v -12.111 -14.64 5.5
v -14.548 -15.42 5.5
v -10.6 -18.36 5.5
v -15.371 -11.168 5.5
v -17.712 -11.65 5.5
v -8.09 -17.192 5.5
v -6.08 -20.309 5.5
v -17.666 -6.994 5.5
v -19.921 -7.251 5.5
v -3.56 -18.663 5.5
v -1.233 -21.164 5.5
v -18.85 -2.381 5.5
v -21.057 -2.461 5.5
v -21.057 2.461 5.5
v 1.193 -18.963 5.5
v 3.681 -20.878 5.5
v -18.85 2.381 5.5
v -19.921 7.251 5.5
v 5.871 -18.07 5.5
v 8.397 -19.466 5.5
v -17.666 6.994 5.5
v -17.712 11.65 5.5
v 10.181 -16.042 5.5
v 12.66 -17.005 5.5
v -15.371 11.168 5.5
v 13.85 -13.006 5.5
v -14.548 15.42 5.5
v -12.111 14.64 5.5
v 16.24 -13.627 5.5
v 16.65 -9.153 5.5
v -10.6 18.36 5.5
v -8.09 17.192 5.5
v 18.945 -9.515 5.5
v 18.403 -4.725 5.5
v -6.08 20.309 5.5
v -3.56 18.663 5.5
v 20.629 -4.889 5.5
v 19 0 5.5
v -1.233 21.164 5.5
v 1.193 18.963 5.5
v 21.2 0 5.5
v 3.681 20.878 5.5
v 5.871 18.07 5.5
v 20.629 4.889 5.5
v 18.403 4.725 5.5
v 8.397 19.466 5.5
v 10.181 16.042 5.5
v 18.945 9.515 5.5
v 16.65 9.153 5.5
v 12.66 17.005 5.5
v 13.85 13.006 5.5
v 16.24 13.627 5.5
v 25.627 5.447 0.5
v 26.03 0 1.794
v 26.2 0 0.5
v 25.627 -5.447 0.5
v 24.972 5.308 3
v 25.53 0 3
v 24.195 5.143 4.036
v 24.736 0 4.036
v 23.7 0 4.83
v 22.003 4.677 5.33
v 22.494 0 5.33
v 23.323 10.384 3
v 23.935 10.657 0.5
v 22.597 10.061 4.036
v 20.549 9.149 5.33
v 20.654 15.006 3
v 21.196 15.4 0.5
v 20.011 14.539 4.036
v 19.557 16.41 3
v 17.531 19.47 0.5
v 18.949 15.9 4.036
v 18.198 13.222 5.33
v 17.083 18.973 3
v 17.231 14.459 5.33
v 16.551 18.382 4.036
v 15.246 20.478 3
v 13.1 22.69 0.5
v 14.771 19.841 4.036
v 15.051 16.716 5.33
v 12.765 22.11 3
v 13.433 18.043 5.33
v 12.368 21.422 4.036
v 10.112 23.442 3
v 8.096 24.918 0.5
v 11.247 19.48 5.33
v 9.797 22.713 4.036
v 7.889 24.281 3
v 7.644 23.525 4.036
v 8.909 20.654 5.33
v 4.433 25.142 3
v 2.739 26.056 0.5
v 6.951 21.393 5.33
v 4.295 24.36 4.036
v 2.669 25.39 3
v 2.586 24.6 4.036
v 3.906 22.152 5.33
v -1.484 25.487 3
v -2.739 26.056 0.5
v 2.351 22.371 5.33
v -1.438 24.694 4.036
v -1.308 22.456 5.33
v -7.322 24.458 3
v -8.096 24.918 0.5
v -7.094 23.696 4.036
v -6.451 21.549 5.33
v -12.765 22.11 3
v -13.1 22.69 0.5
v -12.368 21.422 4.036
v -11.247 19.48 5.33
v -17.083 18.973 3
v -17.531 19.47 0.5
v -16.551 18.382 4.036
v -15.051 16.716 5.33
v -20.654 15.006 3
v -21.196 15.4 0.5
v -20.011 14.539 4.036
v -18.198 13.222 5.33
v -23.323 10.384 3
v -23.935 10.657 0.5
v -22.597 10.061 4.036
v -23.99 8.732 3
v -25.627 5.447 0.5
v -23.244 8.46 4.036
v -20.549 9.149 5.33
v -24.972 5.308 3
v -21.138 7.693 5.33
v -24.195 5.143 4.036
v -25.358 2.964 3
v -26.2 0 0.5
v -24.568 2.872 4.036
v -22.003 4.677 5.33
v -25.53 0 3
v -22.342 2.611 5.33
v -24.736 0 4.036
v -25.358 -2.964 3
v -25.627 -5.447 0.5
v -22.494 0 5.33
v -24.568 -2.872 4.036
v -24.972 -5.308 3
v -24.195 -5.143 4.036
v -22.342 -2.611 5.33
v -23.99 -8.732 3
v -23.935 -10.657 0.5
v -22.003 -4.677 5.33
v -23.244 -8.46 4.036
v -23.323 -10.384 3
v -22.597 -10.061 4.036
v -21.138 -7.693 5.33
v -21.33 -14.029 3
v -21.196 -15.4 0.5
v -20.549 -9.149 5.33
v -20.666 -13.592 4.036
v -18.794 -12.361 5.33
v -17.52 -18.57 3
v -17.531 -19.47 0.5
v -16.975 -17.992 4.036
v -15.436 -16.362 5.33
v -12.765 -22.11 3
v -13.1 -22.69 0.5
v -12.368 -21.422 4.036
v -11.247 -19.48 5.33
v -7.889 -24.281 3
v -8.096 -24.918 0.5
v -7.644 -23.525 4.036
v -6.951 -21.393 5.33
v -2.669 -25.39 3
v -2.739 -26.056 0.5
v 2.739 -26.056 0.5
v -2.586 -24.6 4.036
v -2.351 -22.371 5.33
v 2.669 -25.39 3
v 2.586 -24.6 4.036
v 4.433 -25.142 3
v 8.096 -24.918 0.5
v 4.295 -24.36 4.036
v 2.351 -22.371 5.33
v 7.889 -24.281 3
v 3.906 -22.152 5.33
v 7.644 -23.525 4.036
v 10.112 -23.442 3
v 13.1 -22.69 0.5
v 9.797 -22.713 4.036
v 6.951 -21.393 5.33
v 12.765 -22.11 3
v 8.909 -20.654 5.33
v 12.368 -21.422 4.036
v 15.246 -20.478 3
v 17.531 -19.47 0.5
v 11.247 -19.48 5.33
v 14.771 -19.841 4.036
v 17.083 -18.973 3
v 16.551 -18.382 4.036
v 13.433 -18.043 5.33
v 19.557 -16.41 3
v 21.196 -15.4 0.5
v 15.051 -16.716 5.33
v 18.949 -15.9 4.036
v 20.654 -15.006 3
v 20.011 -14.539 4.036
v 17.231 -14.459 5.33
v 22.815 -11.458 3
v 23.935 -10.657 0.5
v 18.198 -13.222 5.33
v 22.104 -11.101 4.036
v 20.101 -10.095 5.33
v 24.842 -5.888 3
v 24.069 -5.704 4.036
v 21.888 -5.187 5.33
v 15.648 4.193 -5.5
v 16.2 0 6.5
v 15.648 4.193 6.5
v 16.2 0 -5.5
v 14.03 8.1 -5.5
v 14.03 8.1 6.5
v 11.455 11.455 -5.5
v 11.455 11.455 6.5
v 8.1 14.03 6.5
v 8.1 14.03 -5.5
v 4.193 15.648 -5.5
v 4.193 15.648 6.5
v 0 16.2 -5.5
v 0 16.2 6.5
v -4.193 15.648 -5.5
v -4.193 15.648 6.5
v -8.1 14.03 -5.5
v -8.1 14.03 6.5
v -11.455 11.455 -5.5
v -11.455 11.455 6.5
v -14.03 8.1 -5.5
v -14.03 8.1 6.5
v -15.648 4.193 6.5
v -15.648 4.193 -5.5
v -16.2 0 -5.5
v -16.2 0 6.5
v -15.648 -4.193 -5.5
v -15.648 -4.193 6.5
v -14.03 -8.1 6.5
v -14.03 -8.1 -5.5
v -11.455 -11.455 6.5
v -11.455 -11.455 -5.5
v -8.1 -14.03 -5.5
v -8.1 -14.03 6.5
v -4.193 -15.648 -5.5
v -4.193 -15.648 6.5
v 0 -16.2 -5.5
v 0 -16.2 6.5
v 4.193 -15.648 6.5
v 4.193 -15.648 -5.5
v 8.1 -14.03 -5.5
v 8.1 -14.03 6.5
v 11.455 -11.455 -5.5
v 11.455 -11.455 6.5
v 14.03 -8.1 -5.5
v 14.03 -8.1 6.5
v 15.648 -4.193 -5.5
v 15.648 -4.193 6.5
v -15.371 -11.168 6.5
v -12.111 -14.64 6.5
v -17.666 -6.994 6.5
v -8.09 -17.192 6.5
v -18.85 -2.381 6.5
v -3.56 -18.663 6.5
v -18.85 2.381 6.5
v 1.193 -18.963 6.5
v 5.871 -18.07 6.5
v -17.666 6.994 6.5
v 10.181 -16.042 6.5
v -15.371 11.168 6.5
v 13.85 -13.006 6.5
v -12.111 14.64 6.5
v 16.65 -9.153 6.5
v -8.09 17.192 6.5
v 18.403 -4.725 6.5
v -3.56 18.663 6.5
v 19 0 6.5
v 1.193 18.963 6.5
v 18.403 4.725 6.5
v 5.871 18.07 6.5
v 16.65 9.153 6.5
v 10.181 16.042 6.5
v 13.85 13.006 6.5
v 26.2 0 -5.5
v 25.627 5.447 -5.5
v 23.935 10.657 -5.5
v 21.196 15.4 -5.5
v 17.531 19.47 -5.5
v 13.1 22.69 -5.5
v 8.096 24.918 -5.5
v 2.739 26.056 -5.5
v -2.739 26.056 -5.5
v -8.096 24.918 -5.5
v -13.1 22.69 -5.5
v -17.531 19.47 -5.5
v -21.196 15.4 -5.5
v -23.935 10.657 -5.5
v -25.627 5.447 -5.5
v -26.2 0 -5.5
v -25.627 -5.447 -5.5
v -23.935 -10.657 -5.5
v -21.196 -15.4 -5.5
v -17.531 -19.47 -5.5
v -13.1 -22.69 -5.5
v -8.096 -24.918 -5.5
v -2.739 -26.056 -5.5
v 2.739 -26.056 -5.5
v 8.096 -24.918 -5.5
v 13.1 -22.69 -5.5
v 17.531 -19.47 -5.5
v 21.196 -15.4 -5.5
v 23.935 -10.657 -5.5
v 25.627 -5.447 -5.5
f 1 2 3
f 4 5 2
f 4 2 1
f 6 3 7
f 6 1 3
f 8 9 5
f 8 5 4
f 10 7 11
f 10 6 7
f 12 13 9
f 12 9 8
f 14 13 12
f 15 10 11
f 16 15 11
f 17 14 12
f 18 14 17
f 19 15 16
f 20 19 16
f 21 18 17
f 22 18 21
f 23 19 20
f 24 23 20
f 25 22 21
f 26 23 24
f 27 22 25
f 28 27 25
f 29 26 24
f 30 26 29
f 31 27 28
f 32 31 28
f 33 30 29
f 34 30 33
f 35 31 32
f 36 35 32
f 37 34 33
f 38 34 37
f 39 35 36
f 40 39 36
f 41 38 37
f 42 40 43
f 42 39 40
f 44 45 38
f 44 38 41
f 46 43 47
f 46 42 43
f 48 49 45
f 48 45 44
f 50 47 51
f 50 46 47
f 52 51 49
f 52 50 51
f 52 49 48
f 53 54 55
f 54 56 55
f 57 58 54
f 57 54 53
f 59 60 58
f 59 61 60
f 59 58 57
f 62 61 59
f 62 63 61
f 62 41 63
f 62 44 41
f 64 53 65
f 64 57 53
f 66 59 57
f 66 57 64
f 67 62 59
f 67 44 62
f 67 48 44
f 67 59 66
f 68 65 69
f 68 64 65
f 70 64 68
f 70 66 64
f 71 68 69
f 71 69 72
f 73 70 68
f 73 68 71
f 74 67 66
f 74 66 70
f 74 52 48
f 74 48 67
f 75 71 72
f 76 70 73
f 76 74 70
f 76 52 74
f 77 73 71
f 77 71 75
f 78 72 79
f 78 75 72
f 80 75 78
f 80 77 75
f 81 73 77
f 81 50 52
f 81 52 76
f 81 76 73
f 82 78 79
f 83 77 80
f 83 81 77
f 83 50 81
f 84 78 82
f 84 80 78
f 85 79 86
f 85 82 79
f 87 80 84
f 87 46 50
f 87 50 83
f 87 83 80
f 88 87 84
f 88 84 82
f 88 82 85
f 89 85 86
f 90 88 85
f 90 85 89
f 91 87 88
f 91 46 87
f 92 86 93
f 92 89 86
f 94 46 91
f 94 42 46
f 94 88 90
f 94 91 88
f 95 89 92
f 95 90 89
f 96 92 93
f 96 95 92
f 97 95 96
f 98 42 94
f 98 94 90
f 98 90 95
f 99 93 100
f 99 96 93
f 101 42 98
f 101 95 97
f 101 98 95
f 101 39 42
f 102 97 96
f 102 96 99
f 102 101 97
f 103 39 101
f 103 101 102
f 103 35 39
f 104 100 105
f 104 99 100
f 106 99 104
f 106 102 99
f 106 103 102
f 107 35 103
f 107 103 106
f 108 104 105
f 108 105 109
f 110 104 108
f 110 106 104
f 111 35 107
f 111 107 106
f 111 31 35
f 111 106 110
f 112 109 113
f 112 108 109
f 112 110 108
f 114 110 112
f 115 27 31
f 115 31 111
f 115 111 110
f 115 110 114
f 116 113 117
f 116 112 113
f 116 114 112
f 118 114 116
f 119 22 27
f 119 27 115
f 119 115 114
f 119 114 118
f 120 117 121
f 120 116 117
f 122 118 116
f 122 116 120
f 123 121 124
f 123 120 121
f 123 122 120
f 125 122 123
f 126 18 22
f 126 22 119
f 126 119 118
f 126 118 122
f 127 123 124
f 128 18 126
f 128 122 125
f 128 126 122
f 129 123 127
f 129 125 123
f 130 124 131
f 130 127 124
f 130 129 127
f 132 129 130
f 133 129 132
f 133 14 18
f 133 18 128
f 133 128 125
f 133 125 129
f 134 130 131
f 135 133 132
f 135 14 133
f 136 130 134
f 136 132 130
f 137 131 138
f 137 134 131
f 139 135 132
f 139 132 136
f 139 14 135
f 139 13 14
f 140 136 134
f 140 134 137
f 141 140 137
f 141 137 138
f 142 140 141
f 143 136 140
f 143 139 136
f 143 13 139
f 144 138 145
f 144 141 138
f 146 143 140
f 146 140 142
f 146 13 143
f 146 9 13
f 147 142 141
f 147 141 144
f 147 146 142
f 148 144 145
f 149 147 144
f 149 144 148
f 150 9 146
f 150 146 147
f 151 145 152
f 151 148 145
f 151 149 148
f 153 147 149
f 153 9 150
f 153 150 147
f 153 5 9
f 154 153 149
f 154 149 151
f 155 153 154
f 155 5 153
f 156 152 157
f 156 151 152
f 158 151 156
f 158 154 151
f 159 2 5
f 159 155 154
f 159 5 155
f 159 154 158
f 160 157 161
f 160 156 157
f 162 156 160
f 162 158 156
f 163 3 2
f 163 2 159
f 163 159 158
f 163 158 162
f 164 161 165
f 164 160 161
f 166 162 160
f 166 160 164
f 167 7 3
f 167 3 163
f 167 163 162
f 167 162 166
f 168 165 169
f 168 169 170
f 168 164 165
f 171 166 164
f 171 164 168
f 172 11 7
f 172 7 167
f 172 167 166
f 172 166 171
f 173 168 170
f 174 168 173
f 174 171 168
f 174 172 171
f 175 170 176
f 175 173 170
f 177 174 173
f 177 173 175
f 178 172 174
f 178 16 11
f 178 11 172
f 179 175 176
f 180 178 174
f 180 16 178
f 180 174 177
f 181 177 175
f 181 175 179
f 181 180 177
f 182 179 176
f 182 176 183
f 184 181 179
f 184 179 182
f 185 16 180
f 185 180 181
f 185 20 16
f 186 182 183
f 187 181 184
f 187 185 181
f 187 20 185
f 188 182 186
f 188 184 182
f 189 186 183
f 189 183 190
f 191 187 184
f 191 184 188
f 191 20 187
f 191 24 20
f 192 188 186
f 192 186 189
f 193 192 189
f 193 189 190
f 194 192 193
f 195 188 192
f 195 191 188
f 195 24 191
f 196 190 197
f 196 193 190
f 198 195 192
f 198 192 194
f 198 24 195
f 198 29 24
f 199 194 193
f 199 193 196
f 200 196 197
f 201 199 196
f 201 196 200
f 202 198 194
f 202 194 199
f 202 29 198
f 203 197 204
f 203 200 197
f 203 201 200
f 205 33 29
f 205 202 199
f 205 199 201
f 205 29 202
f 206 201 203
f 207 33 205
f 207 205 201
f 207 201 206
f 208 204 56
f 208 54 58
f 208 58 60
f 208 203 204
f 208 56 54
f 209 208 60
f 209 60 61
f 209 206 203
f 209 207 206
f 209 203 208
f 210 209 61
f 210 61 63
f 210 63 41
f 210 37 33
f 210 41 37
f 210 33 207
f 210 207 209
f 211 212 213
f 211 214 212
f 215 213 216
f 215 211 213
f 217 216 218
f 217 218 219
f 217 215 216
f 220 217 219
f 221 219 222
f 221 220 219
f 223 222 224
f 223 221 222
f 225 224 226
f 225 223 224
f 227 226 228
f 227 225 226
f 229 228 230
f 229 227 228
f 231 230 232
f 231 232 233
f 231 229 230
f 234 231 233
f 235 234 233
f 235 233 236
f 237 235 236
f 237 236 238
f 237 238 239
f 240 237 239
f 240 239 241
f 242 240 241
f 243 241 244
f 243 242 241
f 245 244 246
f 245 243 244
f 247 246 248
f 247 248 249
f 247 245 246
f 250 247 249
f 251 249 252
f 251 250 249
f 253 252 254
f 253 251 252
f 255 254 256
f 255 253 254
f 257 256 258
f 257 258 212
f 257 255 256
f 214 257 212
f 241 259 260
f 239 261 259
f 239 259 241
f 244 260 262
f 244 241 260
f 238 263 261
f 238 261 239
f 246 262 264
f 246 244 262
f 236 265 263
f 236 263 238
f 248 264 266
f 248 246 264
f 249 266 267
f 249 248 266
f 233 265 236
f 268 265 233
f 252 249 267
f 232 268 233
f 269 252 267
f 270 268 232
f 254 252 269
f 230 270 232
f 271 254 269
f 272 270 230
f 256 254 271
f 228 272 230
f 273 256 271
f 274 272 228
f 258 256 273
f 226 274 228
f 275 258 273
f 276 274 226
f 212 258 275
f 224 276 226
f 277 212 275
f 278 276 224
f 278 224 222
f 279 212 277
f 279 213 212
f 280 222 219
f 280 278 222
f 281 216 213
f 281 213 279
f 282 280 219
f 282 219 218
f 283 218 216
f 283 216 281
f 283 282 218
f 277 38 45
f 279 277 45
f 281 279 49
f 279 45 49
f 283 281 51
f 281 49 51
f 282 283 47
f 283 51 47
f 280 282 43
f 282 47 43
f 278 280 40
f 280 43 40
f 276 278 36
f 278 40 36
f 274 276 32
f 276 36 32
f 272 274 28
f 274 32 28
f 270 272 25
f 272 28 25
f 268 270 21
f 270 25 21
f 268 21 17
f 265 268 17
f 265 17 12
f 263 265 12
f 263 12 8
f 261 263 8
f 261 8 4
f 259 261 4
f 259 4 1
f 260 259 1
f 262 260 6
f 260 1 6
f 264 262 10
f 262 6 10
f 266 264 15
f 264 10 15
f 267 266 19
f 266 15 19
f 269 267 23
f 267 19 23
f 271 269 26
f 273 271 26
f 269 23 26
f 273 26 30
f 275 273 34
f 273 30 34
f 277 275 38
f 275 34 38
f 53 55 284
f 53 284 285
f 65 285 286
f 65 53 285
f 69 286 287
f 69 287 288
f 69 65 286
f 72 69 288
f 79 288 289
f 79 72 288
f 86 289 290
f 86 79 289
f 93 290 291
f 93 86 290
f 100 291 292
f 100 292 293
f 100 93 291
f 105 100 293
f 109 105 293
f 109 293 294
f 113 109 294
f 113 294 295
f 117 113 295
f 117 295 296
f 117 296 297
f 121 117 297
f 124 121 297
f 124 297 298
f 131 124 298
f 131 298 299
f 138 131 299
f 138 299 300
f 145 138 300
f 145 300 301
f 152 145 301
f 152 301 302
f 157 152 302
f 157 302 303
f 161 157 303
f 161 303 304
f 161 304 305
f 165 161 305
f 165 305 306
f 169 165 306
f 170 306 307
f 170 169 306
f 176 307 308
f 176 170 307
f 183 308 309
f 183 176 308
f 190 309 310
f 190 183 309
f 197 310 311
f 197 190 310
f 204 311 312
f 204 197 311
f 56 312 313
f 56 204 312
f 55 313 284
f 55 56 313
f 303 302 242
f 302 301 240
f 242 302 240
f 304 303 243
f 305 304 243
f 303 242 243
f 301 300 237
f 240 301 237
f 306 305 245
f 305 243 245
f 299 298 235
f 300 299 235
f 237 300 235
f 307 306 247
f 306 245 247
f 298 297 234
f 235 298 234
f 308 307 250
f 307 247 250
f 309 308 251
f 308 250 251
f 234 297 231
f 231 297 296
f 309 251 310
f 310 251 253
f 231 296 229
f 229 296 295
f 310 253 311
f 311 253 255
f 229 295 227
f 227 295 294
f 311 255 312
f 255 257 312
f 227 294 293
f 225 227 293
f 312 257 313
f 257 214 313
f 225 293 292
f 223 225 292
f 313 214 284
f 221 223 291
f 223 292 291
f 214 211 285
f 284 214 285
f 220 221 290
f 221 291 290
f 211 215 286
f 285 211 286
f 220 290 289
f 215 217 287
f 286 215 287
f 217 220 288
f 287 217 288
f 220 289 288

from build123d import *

# Parameters (mm, degrees)
SKETCH_R      = 26.2
SKETCH_R_2    = 16.2
PAD_DEPTH     = 5.5
SKETCH001_R   = 19
SKETCH001_R_2 = 16.2
PAD001_DEPTH  = 1
FILLET_R      = 5


with BuildPart() as part:
    # Sketch → Pad (new body, symmetric)
    with BuildSketch(Plane.XY):
        Circle(SKETCH_R)
        Circle(SKETCH_R_2, mode=Mode.SUBTRACT)
    extrude(amount=PAD_DEPTH, both=True)

    # Sketch001 → Pad001 (new body)
    with BuildSketch(Plane.XY.offset(5.5)):
        Circle(SKETCH001_R)
        Circle(SKETCH001_R_2, mode=Mode.SUBTRACT)
    extrude(amount=PAD001_DEPTH)

    # Fillet
    fillet_edges = [part.edges().sort_by_distance(p)[0] for p in [
        (-26.2, 0, 5.5),
    ]]
    fillet(fillet_edges, radius=FILLET_R)


solid = part.part
